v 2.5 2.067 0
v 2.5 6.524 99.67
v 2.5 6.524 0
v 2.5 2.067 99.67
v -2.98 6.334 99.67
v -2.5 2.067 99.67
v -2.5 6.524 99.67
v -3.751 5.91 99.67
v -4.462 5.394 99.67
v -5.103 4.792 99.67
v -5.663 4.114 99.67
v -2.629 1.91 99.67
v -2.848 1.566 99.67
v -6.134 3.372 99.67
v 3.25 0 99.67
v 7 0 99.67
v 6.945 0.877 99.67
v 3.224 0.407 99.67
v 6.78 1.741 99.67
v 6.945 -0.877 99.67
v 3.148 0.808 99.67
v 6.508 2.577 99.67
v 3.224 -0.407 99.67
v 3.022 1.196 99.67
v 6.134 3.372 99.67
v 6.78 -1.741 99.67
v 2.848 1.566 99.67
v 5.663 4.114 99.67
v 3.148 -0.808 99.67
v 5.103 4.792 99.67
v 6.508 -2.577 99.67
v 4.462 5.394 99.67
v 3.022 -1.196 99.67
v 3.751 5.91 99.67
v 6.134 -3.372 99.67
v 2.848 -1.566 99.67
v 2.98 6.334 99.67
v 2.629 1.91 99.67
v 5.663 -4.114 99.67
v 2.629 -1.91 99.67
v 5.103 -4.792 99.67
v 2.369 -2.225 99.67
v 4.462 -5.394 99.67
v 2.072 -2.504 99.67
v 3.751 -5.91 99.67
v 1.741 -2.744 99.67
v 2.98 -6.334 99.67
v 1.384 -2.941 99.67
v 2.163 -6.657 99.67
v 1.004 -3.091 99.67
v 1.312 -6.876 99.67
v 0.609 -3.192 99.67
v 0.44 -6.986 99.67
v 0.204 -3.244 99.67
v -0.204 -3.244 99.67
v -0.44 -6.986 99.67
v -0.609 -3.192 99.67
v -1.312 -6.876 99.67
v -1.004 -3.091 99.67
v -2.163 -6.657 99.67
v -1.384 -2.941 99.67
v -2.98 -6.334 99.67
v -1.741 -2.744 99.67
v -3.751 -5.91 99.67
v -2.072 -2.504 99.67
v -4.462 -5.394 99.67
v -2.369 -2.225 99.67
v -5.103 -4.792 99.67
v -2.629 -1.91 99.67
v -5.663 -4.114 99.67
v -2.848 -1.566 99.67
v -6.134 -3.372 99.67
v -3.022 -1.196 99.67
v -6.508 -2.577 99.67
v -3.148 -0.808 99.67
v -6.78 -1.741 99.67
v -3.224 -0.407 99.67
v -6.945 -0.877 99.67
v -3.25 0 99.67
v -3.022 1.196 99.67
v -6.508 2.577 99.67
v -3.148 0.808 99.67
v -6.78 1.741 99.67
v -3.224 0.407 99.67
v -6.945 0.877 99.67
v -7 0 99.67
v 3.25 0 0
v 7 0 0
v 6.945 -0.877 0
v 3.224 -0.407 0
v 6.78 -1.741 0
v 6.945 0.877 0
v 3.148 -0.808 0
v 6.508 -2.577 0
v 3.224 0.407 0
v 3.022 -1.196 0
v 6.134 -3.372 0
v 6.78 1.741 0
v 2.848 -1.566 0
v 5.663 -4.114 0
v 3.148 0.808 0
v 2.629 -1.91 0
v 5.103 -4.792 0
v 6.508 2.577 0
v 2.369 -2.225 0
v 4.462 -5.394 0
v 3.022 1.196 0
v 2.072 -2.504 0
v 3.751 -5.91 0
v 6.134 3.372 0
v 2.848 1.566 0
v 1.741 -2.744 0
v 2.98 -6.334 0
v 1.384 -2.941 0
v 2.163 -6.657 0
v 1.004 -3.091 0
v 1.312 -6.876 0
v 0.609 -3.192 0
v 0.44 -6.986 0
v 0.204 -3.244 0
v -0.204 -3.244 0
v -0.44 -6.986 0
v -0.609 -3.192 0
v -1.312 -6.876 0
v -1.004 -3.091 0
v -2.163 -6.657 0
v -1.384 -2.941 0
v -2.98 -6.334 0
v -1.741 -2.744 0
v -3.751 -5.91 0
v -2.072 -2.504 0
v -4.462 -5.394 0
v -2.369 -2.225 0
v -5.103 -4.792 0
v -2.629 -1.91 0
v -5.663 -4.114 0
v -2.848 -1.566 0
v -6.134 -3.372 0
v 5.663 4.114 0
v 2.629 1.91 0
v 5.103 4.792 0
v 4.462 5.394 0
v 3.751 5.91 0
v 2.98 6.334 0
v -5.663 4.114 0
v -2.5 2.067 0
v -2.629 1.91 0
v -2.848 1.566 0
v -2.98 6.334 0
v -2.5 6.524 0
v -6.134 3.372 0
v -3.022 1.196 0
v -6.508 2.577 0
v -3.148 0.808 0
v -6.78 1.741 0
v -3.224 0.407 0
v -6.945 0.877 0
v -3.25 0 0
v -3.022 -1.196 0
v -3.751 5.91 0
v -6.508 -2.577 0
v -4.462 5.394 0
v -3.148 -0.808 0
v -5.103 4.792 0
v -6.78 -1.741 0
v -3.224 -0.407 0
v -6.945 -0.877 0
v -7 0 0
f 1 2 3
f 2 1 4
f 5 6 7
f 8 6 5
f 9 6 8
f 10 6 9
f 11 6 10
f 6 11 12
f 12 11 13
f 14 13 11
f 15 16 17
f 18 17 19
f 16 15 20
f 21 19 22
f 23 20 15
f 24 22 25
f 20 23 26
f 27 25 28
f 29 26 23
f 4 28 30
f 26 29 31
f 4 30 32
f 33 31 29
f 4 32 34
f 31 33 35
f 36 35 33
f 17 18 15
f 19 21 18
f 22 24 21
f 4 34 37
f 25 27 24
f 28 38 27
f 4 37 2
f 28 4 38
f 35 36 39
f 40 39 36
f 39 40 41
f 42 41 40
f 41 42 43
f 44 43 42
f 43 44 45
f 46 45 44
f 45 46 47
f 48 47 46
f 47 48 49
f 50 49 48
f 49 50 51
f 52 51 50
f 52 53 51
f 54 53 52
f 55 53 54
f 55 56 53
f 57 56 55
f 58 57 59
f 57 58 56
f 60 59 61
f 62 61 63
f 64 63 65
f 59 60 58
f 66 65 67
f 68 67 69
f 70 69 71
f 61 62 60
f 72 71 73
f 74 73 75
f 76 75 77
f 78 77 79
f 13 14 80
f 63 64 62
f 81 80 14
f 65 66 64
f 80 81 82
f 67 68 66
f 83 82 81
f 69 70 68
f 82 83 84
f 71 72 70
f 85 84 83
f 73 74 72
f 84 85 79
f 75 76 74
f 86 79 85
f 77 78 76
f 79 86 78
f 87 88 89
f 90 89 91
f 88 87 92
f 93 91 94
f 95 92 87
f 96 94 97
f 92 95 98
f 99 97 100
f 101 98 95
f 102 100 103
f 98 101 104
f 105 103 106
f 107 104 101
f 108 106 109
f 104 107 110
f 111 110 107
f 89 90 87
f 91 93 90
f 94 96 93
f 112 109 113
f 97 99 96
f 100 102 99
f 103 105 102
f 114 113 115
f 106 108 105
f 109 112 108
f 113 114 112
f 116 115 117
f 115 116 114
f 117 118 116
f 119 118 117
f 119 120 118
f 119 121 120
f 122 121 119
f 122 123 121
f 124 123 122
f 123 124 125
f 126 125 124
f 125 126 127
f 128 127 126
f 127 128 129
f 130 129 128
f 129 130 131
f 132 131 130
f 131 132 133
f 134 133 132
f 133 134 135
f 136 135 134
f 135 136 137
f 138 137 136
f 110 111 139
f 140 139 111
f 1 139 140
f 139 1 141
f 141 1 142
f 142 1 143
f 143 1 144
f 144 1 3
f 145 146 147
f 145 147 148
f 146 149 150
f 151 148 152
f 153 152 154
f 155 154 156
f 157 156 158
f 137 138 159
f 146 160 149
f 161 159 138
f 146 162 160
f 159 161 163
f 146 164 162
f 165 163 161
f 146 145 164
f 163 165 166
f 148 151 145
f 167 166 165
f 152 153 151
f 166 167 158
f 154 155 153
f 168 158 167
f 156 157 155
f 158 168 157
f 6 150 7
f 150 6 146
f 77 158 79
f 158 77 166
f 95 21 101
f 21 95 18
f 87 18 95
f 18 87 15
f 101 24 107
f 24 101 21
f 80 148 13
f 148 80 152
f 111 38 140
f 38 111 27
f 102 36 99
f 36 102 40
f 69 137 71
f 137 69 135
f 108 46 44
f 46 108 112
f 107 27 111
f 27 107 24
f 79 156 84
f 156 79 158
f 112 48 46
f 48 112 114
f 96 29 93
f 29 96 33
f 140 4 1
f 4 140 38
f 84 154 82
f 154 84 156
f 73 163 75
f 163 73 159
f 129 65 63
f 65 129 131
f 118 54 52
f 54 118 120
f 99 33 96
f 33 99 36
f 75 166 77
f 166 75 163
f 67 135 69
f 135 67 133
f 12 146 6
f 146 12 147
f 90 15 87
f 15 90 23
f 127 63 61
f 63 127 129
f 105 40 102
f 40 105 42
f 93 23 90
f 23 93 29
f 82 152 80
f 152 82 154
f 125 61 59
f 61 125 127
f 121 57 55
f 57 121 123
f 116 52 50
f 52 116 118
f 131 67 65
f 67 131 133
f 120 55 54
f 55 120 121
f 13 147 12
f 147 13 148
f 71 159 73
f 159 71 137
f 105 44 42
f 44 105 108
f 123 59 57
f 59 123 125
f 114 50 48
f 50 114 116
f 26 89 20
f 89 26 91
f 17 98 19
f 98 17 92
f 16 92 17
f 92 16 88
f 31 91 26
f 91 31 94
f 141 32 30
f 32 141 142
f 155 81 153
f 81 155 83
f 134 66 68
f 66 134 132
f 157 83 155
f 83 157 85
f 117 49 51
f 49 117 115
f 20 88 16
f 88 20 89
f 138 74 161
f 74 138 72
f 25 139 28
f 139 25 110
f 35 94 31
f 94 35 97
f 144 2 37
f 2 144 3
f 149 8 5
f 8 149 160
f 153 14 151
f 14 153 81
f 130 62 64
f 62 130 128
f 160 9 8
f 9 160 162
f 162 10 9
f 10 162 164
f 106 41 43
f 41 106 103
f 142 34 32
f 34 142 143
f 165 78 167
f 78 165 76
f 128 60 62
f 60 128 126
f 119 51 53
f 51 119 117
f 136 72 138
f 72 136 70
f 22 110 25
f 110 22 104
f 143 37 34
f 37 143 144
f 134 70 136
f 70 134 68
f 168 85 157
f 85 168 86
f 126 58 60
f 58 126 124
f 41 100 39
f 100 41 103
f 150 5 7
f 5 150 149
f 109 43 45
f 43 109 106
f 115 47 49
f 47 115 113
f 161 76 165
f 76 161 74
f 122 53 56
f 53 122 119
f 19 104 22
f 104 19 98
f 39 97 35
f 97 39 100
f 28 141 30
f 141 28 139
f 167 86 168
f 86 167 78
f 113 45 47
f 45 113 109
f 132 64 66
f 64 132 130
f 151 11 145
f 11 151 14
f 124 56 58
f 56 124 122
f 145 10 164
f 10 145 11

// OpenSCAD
$fn = 50;


difference() {
	union() {
		cylinder(h = 99.6700000000, r = 7.0000000000);
	}
	union() {
		#translate(v = [-2.5000000000, 0.0000000000, 0]) {
			cube(size = [5, 20, 99.6700000000]);
		}
		translate(v = [0, 0, -100]) {
			cylinder(h = 200, r = 3.2500000000);
		}
		translate(v = [0, 0, -100]) {
			cylinder(h = 200, r = 1.8000000000);
		}
	}
}
